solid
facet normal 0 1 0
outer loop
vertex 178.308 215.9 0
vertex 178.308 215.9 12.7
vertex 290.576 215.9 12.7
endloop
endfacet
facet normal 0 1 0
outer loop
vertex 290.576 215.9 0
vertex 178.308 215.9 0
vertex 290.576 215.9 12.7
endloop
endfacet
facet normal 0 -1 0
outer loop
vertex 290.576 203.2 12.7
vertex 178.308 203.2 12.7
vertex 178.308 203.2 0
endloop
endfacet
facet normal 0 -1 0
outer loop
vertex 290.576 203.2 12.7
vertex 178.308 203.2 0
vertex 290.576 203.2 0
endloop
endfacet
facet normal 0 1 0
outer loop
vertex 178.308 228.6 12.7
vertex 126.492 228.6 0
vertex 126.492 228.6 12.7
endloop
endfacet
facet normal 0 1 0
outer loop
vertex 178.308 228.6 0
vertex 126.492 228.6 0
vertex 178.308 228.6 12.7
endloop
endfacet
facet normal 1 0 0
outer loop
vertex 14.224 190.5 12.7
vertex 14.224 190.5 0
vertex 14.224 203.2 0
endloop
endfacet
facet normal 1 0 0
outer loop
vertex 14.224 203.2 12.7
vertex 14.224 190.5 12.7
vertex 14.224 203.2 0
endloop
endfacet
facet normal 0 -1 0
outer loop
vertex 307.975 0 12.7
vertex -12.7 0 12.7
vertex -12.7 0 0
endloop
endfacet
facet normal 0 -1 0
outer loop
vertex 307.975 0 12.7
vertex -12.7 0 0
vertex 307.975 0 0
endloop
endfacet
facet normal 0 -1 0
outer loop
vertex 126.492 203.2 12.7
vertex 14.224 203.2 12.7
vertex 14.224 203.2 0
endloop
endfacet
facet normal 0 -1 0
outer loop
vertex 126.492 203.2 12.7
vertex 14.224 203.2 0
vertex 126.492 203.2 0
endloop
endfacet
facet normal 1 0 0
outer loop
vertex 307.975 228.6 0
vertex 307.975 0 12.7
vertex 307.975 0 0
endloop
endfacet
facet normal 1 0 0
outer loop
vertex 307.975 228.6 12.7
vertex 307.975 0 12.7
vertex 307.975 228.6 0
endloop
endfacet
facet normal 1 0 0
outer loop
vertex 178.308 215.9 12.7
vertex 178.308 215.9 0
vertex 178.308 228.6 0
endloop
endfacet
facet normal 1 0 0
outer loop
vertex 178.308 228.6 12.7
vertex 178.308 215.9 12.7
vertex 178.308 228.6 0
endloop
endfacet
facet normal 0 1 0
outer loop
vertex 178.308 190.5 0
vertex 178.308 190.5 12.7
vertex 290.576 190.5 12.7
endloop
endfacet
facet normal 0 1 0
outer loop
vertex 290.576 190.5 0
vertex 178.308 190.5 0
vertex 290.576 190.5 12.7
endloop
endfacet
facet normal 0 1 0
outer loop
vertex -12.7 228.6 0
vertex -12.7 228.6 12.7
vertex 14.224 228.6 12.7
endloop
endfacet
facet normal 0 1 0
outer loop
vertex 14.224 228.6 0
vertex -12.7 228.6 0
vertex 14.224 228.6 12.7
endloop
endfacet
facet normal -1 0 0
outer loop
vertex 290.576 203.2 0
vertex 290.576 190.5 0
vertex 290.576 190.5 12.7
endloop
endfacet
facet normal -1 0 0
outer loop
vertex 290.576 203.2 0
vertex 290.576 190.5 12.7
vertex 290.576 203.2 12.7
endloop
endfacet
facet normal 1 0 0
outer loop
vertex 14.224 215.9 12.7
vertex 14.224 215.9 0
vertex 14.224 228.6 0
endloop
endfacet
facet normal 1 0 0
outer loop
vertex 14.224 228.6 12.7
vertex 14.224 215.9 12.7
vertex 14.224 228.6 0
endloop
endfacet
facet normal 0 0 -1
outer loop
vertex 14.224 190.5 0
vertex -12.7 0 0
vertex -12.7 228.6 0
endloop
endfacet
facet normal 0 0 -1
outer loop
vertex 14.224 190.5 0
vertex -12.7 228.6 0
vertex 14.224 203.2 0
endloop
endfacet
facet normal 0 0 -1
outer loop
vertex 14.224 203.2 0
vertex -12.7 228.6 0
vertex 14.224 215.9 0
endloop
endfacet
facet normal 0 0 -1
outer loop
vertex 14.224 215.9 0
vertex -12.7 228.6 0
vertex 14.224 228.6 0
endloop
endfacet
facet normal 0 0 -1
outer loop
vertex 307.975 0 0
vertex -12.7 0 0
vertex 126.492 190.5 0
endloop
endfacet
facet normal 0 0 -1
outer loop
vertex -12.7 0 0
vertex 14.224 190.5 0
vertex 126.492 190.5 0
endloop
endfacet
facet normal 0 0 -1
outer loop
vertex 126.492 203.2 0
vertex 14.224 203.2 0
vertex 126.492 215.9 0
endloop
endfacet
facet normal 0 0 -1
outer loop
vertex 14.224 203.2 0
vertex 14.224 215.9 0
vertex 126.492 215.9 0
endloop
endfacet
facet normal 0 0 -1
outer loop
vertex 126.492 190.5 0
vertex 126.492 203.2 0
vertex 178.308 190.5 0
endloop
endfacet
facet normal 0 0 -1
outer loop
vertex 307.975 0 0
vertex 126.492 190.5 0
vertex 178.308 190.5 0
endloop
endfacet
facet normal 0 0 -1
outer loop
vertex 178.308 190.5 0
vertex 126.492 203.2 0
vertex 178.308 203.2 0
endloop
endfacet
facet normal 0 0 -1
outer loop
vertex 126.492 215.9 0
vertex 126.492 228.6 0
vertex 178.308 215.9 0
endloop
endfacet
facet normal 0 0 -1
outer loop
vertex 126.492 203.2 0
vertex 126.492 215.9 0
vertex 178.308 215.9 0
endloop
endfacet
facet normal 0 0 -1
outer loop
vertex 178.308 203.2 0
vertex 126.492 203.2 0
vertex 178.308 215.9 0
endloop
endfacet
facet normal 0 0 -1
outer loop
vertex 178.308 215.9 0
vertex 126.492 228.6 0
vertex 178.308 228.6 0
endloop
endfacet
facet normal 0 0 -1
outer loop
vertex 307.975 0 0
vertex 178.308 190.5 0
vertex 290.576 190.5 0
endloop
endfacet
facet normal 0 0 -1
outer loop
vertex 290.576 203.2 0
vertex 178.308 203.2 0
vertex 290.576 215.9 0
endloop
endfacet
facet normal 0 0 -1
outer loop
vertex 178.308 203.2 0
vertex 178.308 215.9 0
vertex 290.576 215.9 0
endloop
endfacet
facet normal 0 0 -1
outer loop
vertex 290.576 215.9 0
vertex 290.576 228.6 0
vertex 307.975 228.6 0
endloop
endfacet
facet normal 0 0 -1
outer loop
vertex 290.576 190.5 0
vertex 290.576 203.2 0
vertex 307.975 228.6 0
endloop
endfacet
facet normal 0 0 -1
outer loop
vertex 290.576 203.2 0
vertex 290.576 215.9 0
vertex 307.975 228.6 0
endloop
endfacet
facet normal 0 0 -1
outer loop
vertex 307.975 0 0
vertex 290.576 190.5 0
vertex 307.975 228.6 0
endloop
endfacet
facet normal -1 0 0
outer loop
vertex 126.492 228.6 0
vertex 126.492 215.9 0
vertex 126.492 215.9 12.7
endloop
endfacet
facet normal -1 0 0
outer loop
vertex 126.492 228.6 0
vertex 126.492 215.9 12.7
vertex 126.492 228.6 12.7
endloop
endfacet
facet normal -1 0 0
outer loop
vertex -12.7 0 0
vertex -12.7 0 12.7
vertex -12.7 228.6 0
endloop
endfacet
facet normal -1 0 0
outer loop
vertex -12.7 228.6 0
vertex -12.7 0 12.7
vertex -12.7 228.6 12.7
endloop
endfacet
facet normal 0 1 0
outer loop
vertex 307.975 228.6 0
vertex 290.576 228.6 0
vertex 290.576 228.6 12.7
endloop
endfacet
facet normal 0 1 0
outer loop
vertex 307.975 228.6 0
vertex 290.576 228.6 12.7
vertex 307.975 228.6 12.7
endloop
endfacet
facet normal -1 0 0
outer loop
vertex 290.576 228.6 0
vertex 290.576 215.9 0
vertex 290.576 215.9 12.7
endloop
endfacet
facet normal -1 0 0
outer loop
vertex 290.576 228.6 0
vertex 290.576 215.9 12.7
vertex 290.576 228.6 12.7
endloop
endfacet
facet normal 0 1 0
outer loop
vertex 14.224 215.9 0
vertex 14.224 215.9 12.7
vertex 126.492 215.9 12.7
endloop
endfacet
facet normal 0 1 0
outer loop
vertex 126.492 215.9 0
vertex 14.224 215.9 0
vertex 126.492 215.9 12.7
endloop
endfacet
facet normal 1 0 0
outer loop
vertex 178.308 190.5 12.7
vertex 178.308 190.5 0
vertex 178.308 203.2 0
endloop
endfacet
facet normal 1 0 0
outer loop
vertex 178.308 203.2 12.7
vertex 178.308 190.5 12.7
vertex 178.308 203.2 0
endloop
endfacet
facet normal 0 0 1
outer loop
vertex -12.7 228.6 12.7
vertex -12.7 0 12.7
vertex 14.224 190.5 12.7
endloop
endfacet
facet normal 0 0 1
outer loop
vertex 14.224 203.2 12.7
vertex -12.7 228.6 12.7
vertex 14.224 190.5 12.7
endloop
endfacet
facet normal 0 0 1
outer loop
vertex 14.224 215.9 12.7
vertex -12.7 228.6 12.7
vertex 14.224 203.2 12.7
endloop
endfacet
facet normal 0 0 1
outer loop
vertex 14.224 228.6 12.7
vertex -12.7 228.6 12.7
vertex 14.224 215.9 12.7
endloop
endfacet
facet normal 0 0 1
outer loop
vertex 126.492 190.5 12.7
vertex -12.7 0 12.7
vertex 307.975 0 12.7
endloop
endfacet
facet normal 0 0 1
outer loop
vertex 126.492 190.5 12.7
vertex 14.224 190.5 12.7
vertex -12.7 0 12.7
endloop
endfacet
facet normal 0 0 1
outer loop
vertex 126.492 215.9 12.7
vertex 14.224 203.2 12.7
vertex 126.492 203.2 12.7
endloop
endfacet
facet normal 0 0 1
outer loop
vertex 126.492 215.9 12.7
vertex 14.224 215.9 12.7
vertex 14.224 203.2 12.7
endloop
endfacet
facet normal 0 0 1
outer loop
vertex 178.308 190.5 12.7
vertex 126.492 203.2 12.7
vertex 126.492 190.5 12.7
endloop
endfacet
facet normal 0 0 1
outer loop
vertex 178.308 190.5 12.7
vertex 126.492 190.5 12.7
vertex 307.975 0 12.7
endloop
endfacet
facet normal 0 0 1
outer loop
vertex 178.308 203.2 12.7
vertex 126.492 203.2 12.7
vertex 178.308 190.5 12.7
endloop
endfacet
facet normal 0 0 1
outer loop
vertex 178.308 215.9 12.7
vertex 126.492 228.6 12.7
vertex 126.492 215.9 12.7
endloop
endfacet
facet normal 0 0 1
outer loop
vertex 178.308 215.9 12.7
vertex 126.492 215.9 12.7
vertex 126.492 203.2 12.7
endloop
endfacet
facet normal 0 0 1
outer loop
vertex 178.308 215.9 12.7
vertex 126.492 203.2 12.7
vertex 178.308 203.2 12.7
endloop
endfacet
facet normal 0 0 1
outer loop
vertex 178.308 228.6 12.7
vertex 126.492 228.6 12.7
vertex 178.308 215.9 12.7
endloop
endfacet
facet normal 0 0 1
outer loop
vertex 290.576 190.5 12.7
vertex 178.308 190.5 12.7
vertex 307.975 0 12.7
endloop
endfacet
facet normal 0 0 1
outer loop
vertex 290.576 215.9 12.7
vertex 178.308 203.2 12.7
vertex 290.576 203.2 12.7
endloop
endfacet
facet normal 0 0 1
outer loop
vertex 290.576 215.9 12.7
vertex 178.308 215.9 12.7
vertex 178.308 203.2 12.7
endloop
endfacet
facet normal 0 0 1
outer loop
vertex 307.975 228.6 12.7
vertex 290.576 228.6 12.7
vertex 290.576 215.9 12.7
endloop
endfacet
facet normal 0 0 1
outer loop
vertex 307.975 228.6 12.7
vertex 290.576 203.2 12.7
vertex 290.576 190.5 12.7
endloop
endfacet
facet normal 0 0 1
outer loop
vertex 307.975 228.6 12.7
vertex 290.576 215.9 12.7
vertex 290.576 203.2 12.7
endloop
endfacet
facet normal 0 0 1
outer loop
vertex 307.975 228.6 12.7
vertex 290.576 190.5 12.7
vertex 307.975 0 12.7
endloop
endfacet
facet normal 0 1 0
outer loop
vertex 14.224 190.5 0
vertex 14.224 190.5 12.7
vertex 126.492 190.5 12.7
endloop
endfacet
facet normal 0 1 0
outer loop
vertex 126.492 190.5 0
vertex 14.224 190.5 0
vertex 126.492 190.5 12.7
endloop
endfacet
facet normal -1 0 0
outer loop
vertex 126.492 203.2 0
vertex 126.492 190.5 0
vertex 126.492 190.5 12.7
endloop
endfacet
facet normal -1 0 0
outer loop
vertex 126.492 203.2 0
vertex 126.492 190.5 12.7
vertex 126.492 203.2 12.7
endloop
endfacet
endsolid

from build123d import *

# Parameters (mm, degrees)
SKETCH1_W           = 304.8
SKETCH1_H           = 228.6
BOSS_EXTRUDE1_DEPTH = 12.7
SKETCH7_W           = 112.268
SKETCH7_H           = 12.7
CUT_EXTRUDE2_DEPTH  = 12.7
SKETCH8_W           = 12.7
SKETCH8_H           = 228.6
SKETCH8_W_2         = 3.175
BOSS_EXTRUDE2_DEPTH = 12.7


with BuildPart() as part:
    # Sketch1 → Boss-Extrude1 (new body)
    with BuildSketch(Plane.XY):
        with Locations((152.4, 114.3)):
            Rectangle(SKETCH1_W, SKETCH1_H)
    extrude(amount=BOSS_EXTRUDE1_DEPTH)

    # Sketch7 → Cut-Extrude2 (cut)
    with BuildSketch(Plane.XY.offset(12.7)):
        with Locations((70.358, 222.25)):
            Rectangle(SKETCH7_W, SKETCH7_H)
        with Locations((234.442, 222.25)):
            Rectangle(SKETCH7_W, SKETCH7_H)
        with Locations((70.358, 196.85)):
            Rectangle(SKETCH7_W, SKETCH7_H)
        with Locations((234.442, 196.85)):
            Rectangle(SKETCH7_W, SKETCH7_H)
    extrude(amount=-CUT_EXTRUDE2_DEPTH, mode=Mode.SUBTRACT)

    # Sketch8 → Boss-Extrude2 (add)
    with BuildSketch(Plane.XY.offset(12.7)):
        with Locations((-6.35, 114.3)):
            Rectangle(SKETCH8_W, SKETCH8_H)
        with Locations((306.3875, 114.3)):
            Rectangle(SKETCH8_W_2, SKETCH8_H)
    extrude(amount=-BOSS_EXTRUDE2_DEPTH)


solid = part.part
